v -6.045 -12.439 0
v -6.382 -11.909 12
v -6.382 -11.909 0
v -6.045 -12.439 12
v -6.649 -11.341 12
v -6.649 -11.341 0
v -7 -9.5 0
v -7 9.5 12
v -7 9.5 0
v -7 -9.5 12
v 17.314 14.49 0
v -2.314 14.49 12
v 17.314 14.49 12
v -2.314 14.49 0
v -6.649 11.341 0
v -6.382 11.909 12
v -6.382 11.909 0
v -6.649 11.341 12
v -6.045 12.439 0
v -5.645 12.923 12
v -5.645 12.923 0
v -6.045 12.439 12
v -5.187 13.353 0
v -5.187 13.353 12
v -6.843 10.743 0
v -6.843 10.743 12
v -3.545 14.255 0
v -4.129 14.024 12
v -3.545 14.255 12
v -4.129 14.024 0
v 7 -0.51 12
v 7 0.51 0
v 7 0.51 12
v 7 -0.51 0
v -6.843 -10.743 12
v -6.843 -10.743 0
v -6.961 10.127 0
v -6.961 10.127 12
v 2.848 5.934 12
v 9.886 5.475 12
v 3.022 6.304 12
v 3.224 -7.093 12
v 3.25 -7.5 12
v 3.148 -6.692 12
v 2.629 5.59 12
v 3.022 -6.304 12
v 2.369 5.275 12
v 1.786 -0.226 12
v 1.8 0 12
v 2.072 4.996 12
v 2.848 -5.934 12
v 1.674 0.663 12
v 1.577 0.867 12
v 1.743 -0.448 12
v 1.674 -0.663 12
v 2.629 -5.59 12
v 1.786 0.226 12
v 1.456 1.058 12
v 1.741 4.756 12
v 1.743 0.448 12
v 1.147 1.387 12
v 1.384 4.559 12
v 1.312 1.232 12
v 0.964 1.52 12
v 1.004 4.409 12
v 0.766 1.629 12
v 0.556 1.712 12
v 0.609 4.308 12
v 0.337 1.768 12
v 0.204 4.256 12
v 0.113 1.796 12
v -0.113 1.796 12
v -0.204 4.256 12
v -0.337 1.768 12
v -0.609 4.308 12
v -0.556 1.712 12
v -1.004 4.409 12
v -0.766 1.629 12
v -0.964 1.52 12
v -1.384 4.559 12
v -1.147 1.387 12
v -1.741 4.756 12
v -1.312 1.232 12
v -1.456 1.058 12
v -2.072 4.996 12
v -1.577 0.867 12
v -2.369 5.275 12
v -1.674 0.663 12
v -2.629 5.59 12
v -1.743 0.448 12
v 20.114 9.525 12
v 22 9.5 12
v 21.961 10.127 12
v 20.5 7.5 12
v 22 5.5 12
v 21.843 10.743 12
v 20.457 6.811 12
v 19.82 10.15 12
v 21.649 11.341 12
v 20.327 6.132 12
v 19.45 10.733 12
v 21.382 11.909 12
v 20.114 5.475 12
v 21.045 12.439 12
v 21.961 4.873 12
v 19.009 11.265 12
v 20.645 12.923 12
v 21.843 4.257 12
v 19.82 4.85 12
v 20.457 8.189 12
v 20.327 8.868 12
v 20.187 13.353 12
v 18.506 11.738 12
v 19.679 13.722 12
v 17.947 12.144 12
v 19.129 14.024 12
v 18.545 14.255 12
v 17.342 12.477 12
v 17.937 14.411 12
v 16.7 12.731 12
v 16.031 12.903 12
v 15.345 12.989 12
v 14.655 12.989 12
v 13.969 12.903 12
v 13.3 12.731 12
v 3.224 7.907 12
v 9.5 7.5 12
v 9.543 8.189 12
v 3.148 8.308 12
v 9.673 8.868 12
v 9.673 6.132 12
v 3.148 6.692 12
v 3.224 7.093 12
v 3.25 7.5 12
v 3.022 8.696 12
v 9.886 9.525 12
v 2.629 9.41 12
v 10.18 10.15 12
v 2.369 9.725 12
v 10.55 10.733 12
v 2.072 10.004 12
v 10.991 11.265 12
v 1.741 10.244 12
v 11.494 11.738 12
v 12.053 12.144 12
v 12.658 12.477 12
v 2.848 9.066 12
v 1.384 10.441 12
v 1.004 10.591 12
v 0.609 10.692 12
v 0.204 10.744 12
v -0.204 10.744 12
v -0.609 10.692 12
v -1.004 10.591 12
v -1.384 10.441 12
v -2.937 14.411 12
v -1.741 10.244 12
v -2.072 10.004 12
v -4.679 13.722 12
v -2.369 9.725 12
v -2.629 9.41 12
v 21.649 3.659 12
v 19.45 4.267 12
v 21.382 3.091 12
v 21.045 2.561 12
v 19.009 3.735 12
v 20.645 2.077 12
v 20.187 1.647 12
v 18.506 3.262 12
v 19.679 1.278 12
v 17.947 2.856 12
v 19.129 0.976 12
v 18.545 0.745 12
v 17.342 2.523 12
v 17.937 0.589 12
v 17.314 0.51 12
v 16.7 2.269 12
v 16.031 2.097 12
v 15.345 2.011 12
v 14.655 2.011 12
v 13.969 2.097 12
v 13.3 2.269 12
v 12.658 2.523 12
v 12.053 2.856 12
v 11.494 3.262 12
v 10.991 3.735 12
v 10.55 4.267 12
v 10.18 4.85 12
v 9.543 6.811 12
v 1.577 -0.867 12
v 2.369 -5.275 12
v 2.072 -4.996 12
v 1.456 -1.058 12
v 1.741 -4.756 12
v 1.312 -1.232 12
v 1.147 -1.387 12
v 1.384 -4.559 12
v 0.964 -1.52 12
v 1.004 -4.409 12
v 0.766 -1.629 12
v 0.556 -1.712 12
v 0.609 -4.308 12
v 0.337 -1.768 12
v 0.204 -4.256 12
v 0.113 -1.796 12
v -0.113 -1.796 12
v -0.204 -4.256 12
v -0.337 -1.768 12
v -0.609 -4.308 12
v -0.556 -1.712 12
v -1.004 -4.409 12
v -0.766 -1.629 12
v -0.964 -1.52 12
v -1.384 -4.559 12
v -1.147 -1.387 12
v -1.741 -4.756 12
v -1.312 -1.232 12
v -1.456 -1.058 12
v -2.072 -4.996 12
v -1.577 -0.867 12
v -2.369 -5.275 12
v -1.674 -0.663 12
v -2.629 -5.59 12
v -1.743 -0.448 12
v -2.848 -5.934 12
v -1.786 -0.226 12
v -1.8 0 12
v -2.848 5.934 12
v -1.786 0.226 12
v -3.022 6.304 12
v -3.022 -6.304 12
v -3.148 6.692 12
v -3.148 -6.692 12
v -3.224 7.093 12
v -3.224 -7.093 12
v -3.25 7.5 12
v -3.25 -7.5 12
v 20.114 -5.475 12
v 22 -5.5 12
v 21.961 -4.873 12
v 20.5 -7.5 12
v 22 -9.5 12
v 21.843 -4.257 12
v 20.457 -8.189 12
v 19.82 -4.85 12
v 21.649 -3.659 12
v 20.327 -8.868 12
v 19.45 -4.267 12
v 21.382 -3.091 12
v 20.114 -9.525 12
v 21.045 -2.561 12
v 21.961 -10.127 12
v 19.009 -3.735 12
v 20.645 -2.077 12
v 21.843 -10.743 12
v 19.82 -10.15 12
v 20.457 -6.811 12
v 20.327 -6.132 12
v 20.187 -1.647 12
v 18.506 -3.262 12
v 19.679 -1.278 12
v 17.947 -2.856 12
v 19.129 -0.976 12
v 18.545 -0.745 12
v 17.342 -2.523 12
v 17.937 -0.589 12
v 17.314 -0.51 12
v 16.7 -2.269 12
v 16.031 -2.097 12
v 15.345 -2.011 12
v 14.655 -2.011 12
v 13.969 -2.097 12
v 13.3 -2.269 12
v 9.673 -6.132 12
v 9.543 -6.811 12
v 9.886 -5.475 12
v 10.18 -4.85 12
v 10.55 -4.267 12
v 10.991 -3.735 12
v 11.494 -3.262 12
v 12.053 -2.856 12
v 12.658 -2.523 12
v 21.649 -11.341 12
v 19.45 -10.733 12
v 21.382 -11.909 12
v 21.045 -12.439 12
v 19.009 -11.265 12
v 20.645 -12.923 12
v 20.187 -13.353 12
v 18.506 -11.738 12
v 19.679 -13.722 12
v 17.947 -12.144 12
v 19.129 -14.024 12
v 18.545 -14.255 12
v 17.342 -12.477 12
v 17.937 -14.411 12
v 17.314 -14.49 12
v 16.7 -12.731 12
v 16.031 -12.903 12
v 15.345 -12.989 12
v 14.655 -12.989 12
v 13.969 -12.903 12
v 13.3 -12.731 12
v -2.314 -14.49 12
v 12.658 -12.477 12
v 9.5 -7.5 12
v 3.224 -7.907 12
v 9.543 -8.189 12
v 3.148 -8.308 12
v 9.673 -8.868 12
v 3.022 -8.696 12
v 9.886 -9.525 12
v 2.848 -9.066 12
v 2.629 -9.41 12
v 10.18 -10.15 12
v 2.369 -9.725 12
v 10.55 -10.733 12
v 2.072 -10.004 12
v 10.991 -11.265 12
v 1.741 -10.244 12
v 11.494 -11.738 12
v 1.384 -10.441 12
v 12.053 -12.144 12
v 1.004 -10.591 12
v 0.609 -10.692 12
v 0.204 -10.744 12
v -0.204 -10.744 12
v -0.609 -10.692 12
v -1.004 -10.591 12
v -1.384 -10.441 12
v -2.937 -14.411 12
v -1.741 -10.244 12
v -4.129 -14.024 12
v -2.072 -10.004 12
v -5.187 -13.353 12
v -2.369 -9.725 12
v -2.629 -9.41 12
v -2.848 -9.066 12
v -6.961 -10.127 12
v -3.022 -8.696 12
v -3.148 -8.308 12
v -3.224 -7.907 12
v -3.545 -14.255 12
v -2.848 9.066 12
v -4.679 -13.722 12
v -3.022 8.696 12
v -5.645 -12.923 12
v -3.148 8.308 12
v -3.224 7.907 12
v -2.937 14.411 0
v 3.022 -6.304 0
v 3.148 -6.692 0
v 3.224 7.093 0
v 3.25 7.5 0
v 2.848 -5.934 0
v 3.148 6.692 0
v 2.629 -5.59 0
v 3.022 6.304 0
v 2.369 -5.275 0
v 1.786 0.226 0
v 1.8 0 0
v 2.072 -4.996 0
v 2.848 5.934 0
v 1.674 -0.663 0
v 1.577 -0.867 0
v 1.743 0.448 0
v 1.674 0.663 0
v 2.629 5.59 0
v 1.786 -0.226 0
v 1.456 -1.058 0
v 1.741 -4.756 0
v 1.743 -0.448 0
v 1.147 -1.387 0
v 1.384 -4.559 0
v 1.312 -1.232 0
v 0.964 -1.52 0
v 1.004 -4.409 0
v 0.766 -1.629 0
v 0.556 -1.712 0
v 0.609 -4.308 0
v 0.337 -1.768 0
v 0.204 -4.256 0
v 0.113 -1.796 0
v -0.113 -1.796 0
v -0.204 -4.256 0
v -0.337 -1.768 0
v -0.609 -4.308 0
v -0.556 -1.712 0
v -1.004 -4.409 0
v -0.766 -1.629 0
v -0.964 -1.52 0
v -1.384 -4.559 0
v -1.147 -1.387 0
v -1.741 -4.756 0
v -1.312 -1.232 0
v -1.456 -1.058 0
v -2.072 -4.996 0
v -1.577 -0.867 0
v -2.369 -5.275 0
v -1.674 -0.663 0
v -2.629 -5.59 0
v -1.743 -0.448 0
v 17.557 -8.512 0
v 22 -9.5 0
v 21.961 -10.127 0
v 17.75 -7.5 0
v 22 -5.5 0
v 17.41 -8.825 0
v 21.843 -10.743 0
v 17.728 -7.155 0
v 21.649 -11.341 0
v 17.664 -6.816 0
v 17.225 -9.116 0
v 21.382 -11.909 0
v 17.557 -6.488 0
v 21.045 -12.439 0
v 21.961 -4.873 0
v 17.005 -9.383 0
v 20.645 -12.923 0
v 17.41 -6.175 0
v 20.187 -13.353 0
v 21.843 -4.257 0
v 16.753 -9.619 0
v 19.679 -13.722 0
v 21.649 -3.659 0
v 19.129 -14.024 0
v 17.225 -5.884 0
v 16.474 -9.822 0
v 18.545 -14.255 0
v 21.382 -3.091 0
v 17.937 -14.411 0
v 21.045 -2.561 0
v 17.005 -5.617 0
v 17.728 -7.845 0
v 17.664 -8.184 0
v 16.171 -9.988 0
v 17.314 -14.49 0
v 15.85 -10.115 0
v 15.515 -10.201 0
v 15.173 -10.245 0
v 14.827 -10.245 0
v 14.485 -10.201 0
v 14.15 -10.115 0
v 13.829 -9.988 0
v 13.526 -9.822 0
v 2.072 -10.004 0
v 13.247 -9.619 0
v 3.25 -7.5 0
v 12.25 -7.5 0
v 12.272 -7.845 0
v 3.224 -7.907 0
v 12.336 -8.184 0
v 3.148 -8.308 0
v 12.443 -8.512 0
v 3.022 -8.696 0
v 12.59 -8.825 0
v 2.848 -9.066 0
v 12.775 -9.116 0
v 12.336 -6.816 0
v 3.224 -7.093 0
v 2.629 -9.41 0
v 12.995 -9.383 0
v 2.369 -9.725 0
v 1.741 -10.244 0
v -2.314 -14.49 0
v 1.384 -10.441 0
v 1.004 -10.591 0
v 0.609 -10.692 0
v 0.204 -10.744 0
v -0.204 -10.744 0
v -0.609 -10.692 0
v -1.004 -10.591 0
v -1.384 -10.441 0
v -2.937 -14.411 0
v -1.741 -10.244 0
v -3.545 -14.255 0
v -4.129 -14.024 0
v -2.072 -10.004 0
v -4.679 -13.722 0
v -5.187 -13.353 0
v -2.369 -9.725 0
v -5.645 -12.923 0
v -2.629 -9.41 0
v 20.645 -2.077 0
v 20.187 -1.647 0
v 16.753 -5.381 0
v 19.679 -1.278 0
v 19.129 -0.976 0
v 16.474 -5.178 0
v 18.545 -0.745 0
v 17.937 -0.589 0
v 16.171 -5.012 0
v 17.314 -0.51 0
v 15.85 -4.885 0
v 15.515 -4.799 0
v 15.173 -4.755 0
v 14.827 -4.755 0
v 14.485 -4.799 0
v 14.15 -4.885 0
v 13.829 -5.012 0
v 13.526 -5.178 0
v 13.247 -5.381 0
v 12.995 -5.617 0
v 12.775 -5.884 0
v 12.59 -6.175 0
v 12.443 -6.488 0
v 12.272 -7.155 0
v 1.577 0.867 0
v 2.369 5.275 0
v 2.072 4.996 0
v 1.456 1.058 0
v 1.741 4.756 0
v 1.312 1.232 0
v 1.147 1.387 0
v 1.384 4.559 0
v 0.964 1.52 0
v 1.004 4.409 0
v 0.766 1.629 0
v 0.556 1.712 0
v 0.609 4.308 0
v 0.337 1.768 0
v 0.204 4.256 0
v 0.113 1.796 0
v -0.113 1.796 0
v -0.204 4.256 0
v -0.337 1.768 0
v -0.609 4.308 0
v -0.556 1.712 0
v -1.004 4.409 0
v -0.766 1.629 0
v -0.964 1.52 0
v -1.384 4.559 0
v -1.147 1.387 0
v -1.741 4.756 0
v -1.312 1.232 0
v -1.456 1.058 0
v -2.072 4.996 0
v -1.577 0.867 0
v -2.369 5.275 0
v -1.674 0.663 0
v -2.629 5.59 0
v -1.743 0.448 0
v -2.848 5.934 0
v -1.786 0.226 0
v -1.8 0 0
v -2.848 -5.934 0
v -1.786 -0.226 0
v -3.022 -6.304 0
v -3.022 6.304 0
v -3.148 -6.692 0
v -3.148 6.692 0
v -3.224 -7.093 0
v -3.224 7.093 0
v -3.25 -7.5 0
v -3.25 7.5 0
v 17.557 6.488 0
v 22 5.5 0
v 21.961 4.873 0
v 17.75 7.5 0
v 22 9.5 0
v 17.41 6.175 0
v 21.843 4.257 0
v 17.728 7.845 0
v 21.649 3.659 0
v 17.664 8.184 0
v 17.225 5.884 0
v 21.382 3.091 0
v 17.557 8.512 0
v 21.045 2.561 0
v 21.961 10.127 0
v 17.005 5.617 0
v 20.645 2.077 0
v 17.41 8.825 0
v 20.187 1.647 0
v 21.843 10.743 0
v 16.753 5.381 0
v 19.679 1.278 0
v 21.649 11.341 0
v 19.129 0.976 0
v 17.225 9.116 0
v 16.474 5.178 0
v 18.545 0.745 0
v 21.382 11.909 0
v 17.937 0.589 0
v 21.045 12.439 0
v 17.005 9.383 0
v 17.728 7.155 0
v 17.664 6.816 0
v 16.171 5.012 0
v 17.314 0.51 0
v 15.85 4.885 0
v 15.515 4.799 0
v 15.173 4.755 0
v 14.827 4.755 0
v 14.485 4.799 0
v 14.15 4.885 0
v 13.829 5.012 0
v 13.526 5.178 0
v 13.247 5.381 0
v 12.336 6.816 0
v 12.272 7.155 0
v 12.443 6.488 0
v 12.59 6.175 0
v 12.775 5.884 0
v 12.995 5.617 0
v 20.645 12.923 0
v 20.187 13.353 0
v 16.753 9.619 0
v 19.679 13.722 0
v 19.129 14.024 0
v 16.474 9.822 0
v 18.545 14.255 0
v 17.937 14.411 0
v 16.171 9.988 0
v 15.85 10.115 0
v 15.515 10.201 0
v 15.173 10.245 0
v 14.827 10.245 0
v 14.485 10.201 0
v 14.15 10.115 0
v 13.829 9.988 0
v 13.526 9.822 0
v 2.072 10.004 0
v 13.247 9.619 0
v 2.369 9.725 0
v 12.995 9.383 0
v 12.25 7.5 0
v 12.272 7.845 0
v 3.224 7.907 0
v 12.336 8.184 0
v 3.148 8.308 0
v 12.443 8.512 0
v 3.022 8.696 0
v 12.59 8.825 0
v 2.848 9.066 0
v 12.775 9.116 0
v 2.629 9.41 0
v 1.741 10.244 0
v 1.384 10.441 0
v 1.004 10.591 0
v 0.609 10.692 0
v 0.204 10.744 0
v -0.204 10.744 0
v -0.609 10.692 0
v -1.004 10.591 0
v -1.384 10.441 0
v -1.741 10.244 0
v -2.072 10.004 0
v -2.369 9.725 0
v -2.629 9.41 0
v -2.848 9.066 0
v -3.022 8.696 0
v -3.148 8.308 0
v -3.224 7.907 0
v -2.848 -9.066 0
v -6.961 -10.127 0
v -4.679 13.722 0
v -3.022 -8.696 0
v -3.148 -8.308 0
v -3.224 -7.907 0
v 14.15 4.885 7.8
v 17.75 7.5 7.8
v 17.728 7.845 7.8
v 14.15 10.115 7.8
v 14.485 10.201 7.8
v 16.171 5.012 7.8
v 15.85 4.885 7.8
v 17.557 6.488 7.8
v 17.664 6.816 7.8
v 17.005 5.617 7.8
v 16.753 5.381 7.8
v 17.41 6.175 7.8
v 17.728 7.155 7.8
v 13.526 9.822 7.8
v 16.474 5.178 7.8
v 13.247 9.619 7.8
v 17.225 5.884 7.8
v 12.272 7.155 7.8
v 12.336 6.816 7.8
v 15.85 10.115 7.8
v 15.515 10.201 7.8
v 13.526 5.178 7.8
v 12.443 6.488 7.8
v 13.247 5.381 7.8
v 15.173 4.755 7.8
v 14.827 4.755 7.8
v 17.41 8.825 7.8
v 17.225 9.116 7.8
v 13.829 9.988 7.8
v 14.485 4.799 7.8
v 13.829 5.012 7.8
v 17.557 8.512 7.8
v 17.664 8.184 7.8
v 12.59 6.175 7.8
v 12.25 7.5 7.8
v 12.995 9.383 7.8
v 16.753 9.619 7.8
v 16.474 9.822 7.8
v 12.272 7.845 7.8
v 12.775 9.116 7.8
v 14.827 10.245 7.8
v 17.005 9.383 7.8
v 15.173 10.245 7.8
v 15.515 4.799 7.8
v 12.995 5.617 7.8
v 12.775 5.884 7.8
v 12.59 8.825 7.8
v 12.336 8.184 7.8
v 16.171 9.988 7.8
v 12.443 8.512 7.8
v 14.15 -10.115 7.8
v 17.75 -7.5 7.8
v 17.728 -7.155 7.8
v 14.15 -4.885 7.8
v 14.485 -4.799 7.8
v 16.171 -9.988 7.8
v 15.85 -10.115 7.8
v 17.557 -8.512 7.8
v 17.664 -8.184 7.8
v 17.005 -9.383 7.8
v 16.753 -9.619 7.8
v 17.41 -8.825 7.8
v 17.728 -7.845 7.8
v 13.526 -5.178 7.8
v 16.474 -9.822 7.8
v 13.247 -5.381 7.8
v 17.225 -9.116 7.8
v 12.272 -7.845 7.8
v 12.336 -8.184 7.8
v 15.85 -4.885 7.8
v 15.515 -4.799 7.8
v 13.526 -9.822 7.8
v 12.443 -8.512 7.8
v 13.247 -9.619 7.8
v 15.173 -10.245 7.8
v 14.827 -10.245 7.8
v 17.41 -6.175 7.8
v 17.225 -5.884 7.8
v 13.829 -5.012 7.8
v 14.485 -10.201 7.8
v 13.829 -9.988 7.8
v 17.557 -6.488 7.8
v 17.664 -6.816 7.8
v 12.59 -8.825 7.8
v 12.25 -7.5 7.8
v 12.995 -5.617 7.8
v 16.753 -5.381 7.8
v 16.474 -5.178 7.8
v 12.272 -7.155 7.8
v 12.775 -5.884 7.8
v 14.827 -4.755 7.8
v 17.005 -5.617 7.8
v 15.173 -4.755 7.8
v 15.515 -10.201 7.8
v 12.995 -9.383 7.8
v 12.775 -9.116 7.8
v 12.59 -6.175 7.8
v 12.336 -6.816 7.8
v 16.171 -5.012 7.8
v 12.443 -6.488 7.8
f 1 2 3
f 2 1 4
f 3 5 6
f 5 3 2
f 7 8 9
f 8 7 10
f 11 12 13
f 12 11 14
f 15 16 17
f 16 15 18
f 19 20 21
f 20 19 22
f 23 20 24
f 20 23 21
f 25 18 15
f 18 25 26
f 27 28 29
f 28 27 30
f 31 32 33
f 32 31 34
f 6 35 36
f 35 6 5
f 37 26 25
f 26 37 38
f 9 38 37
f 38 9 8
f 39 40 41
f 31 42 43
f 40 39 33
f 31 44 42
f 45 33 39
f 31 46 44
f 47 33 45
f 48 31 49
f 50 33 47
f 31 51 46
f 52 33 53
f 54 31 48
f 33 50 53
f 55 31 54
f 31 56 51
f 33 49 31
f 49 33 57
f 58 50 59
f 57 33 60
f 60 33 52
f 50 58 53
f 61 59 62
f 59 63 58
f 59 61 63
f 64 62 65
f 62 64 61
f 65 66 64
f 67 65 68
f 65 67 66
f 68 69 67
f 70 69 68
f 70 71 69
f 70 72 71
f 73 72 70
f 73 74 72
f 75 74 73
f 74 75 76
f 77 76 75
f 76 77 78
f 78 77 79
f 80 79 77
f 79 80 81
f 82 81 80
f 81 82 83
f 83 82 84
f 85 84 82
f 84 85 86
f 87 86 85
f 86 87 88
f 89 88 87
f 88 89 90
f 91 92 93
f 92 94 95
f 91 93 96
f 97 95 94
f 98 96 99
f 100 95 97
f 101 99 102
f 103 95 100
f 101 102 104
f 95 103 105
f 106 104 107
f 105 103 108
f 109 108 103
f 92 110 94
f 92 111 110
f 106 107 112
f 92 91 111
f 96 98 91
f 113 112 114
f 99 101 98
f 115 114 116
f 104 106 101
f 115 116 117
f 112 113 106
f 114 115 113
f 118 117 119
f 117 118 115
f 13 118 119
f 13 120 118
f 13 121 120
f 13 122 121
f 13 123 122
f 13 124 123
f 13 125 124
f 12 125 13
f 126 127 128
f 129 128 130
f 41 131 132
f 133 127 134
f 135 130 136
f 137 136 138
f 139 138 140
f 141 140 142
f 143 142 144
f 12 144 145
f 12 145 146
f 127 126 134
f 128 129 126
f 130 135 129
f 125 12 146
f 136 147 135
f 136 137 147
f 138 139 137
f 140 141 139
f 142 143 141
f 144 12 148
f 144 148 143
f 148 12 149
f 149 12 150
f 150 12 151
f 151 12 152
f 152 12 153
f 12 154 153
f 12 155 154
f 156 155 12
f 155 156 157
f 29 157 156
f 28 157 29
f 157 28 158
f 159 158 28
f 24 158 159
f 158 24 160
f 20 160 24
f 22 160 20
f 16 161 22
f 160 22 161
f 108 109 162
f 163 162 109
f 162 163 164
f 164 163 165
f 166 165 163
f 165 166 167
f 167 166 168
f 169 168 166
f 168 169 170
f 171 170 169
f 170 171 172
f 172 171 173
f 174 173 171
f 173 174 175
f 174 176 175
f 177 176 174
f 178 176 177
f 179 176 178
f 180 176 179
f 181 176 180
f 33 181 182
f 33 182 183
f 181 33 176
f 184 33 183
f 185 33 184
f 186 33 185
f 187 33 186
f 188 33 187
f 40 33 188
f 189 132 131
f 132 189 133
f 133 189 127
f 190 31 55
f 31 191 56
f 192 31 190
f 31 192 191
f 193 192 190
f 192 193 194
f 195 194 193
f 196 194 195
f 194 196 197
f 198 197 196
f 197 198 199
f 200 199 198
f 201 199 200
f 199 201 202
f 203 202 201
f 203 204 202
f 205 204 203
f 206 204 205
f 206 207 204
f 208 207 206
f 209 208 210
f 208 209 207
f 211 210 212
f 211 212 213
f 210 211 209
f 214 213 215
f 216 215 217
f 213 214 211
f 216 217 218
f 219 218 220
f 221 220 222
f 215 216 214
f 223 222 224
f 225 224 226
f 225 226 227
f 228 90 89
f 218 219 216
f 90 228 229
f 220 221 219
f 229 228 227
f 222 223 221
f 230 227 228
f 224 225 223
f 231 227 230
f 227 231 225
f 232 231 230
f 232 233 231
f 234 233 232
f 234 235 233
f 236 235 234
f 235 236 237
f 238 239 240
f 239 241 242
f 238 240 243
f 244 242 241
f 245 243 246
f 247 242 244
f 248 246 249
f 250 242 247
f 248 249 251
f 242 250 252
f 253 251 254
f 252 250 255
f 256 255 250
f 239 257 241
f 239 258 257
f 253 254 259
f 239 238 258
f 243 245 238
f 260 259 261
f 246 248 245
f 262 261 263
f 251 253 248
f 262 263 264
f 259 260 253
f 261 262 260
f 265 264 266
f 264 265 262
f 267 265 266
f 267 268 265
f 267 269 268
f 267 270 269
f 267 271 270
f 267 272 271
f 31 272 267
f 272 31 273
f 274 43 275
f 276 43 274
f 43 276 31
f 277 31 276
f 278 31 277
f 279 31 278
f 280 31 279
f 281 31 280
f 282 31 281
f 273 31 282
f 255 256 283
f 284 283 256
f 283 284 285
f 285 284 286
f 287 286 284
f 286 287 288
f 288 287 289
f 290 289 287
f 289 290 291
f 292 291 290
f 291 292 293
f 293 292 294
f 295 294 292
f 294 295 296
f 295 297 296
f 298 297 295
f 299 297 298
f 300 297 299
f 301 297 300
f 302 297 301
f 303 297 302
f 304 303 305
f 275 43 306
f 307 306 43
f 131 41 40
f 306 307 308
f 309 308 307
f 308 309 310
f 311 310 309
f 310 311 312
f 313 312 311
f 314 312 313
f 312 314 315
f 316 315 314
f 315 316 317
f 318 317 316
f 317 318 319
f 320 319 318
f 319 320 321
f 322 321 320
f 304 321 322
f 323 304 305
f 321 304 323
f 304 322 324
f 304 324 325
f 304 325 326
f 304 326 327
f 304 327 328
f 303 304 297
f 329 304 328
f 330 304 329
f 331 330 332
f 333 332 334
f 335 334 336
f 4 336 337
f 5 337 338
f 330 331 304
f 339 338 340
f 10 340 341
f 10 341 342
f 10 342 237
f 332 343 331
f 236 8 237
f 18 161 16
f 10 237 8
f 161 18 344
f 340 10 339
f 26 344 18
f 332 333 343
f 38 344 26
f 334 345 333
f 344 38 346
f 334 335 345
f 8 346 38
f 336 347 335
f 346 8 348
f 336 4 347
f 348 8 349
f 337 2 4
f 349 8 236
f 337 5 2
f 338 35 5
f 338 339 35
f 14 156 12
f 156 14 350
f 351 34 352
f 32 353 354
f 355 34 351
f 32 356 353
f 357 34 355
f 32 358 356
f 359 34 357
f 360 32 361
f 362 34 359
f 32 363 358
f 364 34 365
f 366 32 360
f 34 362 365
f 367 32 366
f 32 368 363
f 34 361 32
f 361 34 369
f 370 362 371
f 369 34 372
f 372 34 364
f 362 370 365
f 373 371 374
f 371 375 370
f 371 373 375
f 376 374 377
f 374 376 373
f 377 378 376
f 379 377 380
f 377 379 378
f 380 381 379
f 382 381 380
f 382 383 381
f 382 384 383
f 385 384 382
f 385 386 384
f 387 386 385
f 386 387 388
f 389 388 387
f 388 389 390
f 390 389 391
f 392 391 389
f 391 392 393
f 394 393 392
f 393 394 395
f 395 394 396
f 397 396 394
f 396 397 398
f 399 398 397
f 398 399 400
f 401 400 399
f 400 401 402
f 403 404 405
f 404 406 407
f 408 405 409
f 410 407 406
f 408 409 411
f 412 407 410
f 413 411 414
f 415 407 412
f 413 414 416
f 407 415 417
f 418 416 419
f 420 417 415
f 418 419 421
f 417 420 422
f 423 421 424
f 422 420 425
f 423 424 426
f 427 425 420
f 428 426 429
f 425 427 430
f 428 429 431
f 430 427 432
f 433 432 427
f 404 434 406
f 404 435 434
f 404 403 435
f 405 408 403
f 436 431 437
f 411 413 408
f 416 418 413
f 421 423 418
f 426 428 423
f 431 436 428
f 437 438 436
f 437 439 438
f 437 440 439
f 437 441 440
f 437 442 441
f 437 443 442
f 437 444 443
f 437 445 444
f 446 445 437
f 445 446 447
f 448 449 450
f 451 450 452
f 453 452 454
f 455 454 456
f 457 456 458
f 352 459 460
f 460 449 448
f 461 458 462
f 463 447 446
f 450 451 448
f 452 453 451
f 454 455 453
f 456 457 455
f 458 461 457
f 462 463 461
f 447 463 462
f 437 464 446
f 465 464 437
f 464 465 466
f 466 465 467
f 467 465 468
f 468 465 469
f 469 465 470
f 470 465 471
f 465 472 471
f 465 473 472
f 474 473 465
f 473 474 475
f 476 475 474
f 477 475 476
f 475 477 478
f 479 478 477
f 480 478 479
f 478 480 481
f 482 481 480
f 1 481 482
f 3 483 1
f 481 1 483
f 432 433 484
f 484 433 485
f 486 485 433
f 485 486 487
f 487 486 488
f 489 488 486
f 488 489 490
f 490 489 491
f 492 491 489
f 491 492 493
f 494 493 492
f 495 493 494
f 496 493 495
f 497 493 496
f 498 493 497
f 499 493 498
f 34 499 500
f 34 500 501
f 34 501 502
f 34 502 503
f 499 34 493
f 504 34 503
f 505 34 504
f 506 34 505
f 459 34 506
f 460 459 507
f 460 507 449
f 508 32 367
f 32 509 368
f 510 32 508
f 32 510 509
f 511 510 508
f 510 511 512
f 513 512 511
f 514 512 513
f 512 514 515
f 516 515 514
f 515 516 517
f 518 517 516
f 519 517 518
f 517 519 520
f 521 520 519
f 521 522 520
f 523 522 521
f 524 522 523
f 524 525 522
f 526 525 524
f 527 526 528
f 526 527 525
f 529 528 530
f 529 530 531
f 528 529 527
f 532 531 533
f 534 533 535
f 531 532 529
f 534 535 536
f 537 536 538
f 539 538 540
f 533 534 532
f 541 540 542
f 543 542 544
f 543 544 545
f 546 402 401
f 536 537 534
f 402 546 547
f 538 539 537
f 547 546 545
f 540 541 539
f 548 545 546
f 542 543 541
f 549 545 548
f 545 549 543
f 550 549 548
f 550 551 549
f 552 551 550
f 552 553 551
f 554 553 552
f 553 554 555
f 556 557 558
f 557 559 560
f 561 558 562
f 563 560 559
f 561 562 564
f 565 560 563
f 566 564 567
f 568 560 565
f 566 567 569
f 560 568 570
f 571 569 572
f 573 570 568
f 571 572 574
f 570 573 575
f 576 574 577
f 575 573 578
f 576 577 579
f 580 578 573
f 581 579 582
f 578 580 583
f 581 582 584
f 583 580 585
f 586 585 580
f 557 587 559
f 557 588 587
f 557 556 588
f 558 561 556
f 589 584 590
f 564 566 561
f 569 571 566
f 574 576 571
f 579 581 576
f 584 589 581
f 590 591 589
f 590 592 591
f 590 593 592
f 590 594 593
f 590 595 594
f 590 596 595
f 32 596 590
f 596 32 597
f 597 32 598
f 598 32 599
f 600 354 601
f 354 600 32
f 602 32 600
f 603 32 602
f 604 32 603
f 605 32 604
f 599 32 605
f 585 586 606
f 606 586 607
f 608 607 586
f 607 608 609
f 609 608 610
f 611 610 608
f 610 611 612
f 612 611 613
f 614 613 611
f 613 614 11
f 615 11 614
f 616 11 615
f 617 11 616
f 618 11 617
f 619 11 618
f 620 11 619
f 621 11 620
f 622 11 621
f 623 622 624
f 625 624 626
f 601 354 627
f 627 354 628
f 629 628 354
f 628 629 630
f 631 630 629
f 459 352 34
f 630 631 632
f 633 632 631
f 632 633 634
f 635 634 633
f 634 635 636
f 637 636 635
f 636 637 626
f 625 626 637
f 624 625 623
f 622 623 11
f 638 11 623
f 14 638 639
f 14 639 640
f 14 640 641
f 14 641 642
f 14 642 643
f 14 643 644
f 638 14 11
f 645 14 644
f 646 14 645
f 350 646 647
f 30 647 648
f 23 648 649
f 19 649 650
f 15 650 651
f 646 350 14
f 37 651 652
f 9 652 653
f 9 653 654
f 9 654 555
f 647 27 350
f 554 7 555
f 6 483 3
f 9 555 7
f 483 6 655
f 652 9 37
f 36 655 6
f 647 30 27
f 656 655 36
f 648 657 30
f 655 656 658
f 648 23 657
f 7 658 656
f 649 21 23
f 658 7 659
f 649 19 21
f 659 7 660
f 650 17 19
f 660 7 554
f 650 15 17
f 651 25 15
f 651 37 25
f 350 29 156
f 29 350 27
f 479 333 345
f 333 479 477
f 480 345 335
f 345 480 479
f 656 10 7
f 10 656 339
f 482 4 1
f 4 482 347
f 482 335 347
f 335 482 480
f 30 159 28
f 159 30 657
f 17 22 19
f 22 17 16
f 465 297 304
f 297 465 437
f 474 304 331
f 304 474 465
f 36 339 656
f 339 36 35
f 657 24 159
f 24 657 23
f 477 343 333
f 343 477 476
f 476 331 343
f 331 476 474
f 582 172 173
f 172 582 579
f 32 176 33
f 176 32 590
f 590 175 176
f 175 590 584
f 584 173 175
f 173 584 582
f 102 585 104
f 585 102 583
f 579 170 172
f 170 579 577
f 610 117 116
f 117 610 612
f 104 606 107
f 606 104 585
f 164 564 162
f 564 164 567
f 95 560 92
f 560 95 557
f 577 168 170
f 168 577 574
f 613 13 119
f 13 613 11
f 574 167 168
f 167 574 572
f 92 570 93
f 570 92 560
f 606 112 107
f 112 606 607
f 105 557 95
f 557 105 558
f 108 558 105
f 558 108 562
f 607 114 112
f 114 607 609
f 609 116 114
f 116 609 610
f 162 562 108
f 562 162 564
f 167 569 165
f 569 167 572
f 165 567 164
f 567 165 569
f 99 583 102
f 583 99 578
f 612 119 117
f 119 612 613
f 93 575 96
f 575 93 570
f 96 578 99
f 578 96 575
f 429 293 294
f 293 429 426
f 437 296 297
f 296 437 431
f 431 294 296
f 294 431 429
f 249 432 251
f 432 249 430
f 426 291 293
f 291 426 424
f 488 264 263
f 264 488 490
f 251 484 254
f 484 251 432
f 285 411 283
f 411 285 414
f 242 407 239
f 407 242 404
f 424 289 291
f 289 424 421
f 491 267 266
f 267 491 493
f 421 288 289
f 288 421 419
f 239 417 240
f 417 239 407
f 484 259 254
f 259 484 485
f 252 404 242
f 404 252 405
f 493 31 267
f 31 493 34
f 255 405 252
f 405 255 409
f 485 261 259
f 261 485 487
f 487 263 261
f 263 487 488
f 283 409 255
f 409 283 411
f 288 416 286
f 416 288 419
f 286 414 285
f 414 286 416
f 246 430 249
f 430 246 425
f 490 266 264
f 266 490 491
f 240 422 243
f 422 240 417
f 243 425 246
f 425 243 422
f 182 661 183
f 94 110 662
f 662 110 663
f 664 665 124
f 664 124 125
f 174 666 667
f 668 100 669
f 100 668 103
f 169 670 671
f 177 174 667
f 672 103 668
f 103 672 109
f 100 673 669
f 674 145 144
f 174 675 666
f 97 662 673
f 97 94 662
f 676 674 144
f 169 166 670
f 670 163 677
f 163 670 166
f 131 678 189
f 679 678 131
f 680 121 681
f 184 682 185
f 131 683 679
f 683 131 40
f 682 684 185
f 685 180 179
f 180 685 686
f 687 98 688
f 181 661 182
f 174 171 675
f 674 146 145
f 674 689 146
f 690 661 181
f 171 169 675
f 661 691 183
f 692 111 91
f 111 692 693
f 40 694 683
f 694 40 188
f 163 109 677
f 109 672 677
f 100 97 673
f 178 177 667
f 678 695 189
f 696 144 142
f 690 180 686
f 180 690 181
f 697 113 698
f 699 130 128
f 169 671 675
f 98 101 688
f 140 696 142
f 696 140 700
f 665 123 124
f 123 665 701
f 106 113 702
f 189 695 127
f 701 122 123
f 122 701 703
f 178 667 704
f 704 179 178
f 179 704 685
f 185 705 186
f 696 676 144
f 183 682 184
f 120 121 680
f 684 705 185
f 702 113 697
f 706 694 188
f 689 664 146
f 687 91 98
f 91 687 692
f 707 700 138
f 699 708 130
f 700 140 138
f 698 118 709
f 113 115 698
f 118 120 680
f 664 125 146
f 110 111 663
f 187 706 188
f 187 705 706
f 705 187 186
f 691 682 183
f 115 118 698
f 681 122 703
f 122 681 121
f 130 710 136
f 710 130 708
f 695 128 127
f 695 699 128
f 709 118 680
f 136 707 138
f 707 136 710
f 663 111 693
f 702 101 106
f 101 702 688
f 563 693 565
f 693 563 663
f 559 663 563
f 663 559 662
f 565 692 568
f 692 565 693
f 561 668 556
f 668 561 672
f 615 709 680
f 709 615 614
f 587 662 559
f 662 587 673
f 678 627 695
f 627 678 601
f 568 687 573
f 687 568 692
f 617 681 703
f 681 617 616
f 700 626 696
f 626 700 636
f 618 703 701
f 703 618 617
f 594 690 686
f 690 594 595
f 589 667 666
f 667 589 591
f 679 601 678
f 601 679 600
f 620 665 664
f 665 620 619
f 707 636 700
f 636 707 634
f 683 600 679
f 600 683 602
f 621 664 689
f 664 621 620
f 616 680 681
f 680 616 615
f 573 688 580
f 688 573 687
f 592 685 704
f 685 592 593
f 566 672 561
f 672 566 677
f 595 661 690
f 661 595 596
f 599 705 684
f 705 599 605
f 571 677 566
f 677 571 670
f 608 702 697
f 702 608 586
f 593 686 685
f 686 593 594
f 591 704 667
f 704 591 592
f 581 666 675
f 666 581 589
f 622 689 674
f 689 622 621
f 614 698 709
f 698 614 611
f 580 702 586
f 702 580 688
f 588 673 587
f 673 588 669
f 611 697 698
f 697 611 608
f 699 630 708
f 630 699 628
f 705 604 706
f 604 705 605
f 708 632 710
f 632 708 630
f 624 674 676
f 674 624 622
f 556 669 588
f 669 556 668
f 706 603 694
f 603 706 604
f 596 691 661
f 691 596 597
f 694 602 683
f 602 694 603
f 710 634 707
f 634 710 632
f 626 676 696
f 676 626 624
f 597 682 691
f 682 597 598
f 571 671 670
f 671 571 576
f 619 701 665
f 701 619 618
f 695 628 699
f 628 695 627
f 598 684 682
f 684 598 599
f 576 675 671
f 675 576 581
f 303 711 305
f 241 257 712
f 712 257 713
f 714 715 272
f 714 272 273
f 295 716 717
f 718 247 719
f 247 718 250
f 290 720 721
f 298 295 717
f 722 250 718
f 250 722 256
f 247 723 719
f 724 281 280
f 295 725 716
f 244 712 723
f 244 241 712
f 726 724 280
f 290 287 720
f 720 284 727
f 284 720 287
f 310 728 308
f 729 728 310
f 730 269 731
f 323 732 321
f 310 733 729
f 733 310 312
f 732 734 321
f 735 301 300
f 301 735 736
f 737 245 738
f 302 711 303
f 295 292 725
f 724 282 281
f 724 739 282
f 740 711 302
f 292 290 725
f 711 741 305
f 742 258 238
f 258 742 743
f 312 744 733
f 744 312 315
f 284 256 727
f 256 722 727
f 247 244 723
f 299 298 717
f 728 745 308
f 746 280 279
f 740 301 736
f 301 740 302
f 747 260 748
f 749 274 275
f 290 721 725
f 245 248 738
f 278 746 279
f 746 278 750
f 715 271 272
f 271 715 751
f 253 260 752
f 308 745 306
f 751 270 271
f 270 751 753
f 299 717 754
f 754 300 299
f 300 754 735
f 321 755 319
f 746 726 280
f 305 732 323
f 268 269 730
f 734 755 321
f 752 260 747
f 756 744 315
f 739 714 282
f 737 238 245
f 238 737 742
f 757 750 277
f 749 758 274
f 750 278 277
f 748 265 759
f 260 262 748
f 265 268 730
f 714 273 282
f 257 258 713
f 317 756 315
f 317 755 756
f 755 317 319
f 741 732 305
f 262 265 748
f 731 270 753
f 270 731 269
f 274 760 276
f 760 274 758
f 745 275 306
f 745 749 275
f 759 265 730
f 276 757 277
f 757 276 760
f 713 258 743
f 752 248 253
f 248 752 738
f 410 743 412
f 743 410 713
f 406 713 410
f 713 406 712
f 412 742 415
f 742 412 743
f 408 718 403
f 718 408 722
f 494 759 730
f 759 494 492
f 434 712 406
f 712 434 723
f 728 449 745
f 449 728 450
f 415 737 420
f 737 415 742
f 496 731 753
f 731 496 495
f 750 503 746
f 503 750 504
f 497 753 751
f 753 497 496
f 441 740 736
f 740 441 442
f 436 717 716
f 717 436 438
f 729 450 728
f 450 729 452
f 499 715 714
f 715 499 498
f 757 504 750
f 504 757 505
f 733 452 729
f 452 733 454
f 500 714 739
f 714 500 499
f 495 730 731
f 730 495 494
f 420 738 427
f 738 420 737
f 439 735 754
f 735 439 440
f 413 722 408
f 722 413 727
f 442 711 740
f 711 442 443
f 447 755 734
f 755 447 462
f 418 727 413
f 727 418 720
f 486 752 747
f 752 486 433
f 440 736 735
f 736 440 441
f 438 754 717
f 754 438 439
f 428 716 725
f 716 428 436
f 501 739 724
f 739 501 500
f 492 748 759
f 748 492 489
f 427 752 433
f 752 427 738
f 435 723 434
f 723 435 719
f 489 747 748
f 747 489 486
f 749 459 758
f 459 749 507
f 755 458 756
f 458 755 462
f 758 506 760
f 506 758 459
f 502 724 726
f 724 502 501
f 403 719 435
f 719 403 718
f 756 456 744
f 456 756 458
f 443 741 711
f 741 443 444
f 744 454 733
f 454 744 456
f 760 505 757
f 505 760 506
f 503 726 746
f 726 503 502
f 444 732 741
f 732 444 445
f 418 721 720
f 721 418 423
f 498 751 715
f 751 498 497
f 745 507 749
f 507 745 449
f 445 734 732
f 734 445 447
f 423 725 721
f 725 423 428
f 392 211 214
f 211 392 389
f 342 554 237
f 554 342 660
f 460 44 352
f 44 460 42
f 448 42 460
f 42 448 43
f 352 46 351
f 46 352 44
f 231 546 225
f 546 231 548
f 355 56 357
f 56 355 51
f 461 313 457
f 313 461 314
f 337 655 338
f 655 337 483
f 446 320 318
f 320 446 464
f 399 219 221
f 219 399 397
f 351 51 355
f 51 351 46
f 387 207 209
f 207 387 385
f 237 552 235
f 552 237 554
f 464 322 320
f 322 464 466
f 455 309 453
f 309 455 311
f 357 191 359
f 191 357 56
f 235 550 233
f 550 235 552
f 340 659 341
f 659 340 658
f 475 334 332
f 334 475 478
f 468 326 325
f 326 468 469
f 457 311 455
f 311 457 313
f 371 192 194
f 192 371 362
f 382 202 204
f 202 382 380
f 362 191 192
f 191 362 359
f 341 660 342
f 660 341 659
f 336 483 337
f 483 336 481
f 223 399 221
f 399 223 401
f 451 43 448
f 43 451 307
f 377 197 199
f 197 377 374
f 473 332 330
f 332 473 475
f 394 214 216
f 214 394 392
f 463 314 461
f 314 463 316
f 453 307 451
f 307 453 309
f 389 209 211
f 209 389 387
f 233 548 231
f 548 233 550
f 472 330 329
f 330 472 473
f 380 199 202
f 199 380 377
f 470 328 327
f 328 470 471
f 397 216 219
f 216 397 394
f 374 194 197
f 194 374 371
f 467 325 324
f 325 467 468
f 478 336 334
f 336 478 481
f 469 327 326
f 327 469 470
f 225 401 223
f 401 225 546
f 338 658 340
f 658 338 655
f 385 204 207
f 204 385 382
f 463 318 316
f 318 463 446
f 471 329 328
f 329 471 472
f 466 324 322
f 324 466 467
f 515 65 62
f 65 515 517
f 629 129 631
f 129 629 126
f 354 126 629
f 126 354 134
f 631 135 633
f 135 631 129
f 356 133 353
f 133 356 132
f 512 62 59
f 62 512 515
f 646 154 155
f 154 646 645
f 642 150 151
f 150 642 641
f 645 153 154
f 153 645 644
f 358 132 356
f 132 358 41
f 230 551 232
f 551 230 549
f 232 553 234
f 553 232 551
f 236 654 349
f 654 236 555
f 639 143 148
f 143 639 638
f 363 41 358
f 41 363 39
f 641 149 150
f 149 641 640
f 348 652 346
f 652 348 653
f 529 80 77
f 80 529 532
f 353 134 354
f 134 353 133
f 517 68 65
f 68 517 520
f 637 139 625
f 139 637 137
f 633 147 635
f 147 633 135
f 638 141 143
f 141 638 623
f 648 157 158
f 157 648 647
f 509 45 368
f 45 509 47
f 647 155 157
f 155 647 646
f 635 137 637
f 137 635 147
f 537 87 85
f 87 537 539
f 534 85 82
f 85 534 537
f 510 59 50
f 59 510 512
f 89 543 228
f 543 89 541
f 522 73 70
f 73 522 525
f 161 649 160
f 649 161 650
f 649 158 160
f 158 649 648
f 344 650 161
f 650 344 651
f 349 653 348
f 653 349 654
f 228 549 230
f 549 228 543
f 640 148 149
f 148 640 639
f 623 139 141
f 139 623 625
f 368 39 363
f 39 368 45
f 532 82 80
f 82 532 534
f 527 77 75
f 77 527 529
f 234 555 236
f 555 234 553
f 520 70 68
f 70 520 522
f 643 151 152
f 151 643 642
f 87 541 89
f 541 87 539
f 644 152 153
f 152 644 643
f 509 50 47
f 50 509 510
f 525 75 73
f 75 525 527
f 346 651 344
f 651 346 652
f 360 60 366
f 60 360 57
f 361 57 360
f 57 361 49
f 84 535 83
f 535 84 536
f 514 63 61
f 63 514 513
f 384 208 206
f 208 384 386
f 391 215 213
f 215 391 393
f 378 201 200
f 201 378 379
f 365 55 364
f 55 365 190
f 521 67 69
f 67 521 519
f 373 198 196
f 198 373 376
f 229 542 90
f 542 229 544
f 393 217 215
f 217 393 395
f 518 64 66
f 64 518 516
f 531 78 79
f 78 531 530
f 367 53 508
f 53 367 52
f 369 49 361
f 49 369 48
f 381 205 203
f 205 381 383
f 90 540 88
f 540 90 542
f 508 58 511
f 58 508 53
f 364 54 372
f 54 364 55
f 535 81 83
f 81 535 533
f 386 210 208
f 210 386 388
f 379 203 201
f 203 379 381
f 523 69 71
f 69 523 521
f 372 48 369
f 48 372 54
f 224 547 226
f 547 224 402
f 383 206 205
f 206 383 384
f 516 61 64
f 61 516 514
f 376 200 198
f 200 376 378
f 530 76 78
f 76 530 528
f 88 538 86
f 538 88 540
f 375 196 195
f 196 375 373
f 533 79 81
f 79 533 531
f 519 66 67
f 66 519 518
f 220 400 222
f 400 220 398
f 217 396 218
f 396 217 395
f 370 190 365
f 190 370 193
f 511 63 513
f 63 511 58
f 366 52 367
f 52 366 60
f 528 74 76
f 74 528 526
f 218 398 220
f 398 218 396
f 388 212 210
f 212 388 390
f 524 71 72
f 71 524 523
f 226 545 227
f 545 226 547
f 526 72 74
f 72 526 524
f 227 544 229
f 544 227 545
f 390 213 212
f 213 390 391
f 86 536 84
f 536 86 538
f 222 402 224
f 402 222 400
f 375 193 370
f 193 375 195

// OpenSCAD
$fn = 50;


difference() {
	union() {
		hull() {
			translate(v = [-2.0000000000, 9.5000000000, 0]) {
				cylinder(h = 12, r = 5);
			}
			translate(v = [2.0000000000, 9.5000000000, 0]) {
				cylinder(h = 12, r = 5);
			}
			translate(v = [-2.0000000000, -9.5000000000, 0]) {
				cylinder(h = 12, r = 5);
			}
			translate(v = [2.0000000000, -9.5000000000, 0]) {
				cylinder(h = 12, r = 5);
			}
		}
		translate(v = [7.5000000000, 7.5000000000, 0]) {
			hull() {
				translate(v = [-9.5000000000, 2.0000000000, 0]) {
					cylinder(h = 12, r = 5);
				}
				translate(v = [9.5000000000, 2.0000000000, 0]) {
					cylinder(h = 12, r = 5);
				}
				translate(v = [-9.5000000000, -2.0000000000, 0]) {
					cylinder(h = 12, r = 5);
				}
				translate(v = [9.5000000000, -2.0000000000, 0]) {
					cylinder(h = 12, r = 5);
				}
			}
		}
		translate(v = [7.5000000000, -7.5000000000, 0]) {
			hull() {
				translate(v = [-9.5000000000, 2.0000000000, 0]) {
					cylinder(h = 12, r = 5);
				}
				translate(v = [9.5000000000, 2.0000000000, 0]) {
					cylinder(h = 12, r = 5);
				}
				translate(v = [-9.5000000000, -2.0000000000, 0]) {
					cylinder(h = 12, r = 5);
				}
				translate(v = [9.5000000000, -2.0000000000, 0]) {
					cylinder(h = 12, r = 5);
				}
			}
		}
	}
	union() {
		translate(v = [15.0000000000, 7.5000000000, 12]) {
			rotate(a = [0, 0, 0]) {
				difference() {
					union() {
						#translate(v = [0, 0, -12.0000000000]) {
							cylinder(h = 12, r = 2.2500000000);
						}
						#translate(v = [0, 0, -4.2000000000]) {
							cylinder(h = 4.2000000000, r1 = 2.7500000000, r2 = 5.5000000000);
						}
						#translate(v = [0, 0, -12.0000000000]) {
							cylinder(h = 12, r = 2.7500000000);
						}
						#translate(v = [0, 0, -12.0000000000]) {
							cylinder(h = 12, r = 2.2500000000);
						}
					}
					union();
				}
			}
		}
		translate(v = [15.0000000000, -7.5000000000, 12]) {
			rotate(a = [0, 0, 0]) {
				difference() {
					union() {
						#translate(v = [0, 0, -12.0000000000]) {
							cylinder(h = 12, r = 2.2500000000);
						}
						#translate(v = [0, 0, -4.2000000000]) {
							cylinder(h = 4.2000000000, r1 = 2.7500000000, r2 = 5.5000000000);
						}
						#translate(v = [0, 0, -12.0000000000]) {
							cylinder(h = 12, r = 2.7500000000);
						}
						#translate(v = [0, 0, -12.0000000000]) {
							cylinder(h = 12, r = 2.2500000000);
						}
					}
					union();
				}
			}
		}
		translate(v = [0.0000000000, -7.5000000000, 0]) {
			translate(v = [0, 0, -100]) {
				cylinder(h = 200, r = 3.2500000000);
			}
		}
		translate(v = [0.0000000000, 7.5000000000, 0]) {
			translate(v = [0, 0, -100]) {
				cylinder(h = 200, r = 3.2500000000);
			}
		}
		translate(v = [0.0000000000, -7.5000000000, 0]) {
			translate(v = [0, 0, -100]) {
				cylinder(h = 200, r = 1.8000000000);
			}
		}
		translate(v = [0, 0, -100]) {
			cylinder(h = 200, r = 1.8000000000);
		}
		translate(v = [0.0000000000, 7.5000000000, 0]) {
			translate(v = [0, 0, -100]) {
				cylinder(h = 200, r = 1.8000000000);
			}
		}
	}
}
